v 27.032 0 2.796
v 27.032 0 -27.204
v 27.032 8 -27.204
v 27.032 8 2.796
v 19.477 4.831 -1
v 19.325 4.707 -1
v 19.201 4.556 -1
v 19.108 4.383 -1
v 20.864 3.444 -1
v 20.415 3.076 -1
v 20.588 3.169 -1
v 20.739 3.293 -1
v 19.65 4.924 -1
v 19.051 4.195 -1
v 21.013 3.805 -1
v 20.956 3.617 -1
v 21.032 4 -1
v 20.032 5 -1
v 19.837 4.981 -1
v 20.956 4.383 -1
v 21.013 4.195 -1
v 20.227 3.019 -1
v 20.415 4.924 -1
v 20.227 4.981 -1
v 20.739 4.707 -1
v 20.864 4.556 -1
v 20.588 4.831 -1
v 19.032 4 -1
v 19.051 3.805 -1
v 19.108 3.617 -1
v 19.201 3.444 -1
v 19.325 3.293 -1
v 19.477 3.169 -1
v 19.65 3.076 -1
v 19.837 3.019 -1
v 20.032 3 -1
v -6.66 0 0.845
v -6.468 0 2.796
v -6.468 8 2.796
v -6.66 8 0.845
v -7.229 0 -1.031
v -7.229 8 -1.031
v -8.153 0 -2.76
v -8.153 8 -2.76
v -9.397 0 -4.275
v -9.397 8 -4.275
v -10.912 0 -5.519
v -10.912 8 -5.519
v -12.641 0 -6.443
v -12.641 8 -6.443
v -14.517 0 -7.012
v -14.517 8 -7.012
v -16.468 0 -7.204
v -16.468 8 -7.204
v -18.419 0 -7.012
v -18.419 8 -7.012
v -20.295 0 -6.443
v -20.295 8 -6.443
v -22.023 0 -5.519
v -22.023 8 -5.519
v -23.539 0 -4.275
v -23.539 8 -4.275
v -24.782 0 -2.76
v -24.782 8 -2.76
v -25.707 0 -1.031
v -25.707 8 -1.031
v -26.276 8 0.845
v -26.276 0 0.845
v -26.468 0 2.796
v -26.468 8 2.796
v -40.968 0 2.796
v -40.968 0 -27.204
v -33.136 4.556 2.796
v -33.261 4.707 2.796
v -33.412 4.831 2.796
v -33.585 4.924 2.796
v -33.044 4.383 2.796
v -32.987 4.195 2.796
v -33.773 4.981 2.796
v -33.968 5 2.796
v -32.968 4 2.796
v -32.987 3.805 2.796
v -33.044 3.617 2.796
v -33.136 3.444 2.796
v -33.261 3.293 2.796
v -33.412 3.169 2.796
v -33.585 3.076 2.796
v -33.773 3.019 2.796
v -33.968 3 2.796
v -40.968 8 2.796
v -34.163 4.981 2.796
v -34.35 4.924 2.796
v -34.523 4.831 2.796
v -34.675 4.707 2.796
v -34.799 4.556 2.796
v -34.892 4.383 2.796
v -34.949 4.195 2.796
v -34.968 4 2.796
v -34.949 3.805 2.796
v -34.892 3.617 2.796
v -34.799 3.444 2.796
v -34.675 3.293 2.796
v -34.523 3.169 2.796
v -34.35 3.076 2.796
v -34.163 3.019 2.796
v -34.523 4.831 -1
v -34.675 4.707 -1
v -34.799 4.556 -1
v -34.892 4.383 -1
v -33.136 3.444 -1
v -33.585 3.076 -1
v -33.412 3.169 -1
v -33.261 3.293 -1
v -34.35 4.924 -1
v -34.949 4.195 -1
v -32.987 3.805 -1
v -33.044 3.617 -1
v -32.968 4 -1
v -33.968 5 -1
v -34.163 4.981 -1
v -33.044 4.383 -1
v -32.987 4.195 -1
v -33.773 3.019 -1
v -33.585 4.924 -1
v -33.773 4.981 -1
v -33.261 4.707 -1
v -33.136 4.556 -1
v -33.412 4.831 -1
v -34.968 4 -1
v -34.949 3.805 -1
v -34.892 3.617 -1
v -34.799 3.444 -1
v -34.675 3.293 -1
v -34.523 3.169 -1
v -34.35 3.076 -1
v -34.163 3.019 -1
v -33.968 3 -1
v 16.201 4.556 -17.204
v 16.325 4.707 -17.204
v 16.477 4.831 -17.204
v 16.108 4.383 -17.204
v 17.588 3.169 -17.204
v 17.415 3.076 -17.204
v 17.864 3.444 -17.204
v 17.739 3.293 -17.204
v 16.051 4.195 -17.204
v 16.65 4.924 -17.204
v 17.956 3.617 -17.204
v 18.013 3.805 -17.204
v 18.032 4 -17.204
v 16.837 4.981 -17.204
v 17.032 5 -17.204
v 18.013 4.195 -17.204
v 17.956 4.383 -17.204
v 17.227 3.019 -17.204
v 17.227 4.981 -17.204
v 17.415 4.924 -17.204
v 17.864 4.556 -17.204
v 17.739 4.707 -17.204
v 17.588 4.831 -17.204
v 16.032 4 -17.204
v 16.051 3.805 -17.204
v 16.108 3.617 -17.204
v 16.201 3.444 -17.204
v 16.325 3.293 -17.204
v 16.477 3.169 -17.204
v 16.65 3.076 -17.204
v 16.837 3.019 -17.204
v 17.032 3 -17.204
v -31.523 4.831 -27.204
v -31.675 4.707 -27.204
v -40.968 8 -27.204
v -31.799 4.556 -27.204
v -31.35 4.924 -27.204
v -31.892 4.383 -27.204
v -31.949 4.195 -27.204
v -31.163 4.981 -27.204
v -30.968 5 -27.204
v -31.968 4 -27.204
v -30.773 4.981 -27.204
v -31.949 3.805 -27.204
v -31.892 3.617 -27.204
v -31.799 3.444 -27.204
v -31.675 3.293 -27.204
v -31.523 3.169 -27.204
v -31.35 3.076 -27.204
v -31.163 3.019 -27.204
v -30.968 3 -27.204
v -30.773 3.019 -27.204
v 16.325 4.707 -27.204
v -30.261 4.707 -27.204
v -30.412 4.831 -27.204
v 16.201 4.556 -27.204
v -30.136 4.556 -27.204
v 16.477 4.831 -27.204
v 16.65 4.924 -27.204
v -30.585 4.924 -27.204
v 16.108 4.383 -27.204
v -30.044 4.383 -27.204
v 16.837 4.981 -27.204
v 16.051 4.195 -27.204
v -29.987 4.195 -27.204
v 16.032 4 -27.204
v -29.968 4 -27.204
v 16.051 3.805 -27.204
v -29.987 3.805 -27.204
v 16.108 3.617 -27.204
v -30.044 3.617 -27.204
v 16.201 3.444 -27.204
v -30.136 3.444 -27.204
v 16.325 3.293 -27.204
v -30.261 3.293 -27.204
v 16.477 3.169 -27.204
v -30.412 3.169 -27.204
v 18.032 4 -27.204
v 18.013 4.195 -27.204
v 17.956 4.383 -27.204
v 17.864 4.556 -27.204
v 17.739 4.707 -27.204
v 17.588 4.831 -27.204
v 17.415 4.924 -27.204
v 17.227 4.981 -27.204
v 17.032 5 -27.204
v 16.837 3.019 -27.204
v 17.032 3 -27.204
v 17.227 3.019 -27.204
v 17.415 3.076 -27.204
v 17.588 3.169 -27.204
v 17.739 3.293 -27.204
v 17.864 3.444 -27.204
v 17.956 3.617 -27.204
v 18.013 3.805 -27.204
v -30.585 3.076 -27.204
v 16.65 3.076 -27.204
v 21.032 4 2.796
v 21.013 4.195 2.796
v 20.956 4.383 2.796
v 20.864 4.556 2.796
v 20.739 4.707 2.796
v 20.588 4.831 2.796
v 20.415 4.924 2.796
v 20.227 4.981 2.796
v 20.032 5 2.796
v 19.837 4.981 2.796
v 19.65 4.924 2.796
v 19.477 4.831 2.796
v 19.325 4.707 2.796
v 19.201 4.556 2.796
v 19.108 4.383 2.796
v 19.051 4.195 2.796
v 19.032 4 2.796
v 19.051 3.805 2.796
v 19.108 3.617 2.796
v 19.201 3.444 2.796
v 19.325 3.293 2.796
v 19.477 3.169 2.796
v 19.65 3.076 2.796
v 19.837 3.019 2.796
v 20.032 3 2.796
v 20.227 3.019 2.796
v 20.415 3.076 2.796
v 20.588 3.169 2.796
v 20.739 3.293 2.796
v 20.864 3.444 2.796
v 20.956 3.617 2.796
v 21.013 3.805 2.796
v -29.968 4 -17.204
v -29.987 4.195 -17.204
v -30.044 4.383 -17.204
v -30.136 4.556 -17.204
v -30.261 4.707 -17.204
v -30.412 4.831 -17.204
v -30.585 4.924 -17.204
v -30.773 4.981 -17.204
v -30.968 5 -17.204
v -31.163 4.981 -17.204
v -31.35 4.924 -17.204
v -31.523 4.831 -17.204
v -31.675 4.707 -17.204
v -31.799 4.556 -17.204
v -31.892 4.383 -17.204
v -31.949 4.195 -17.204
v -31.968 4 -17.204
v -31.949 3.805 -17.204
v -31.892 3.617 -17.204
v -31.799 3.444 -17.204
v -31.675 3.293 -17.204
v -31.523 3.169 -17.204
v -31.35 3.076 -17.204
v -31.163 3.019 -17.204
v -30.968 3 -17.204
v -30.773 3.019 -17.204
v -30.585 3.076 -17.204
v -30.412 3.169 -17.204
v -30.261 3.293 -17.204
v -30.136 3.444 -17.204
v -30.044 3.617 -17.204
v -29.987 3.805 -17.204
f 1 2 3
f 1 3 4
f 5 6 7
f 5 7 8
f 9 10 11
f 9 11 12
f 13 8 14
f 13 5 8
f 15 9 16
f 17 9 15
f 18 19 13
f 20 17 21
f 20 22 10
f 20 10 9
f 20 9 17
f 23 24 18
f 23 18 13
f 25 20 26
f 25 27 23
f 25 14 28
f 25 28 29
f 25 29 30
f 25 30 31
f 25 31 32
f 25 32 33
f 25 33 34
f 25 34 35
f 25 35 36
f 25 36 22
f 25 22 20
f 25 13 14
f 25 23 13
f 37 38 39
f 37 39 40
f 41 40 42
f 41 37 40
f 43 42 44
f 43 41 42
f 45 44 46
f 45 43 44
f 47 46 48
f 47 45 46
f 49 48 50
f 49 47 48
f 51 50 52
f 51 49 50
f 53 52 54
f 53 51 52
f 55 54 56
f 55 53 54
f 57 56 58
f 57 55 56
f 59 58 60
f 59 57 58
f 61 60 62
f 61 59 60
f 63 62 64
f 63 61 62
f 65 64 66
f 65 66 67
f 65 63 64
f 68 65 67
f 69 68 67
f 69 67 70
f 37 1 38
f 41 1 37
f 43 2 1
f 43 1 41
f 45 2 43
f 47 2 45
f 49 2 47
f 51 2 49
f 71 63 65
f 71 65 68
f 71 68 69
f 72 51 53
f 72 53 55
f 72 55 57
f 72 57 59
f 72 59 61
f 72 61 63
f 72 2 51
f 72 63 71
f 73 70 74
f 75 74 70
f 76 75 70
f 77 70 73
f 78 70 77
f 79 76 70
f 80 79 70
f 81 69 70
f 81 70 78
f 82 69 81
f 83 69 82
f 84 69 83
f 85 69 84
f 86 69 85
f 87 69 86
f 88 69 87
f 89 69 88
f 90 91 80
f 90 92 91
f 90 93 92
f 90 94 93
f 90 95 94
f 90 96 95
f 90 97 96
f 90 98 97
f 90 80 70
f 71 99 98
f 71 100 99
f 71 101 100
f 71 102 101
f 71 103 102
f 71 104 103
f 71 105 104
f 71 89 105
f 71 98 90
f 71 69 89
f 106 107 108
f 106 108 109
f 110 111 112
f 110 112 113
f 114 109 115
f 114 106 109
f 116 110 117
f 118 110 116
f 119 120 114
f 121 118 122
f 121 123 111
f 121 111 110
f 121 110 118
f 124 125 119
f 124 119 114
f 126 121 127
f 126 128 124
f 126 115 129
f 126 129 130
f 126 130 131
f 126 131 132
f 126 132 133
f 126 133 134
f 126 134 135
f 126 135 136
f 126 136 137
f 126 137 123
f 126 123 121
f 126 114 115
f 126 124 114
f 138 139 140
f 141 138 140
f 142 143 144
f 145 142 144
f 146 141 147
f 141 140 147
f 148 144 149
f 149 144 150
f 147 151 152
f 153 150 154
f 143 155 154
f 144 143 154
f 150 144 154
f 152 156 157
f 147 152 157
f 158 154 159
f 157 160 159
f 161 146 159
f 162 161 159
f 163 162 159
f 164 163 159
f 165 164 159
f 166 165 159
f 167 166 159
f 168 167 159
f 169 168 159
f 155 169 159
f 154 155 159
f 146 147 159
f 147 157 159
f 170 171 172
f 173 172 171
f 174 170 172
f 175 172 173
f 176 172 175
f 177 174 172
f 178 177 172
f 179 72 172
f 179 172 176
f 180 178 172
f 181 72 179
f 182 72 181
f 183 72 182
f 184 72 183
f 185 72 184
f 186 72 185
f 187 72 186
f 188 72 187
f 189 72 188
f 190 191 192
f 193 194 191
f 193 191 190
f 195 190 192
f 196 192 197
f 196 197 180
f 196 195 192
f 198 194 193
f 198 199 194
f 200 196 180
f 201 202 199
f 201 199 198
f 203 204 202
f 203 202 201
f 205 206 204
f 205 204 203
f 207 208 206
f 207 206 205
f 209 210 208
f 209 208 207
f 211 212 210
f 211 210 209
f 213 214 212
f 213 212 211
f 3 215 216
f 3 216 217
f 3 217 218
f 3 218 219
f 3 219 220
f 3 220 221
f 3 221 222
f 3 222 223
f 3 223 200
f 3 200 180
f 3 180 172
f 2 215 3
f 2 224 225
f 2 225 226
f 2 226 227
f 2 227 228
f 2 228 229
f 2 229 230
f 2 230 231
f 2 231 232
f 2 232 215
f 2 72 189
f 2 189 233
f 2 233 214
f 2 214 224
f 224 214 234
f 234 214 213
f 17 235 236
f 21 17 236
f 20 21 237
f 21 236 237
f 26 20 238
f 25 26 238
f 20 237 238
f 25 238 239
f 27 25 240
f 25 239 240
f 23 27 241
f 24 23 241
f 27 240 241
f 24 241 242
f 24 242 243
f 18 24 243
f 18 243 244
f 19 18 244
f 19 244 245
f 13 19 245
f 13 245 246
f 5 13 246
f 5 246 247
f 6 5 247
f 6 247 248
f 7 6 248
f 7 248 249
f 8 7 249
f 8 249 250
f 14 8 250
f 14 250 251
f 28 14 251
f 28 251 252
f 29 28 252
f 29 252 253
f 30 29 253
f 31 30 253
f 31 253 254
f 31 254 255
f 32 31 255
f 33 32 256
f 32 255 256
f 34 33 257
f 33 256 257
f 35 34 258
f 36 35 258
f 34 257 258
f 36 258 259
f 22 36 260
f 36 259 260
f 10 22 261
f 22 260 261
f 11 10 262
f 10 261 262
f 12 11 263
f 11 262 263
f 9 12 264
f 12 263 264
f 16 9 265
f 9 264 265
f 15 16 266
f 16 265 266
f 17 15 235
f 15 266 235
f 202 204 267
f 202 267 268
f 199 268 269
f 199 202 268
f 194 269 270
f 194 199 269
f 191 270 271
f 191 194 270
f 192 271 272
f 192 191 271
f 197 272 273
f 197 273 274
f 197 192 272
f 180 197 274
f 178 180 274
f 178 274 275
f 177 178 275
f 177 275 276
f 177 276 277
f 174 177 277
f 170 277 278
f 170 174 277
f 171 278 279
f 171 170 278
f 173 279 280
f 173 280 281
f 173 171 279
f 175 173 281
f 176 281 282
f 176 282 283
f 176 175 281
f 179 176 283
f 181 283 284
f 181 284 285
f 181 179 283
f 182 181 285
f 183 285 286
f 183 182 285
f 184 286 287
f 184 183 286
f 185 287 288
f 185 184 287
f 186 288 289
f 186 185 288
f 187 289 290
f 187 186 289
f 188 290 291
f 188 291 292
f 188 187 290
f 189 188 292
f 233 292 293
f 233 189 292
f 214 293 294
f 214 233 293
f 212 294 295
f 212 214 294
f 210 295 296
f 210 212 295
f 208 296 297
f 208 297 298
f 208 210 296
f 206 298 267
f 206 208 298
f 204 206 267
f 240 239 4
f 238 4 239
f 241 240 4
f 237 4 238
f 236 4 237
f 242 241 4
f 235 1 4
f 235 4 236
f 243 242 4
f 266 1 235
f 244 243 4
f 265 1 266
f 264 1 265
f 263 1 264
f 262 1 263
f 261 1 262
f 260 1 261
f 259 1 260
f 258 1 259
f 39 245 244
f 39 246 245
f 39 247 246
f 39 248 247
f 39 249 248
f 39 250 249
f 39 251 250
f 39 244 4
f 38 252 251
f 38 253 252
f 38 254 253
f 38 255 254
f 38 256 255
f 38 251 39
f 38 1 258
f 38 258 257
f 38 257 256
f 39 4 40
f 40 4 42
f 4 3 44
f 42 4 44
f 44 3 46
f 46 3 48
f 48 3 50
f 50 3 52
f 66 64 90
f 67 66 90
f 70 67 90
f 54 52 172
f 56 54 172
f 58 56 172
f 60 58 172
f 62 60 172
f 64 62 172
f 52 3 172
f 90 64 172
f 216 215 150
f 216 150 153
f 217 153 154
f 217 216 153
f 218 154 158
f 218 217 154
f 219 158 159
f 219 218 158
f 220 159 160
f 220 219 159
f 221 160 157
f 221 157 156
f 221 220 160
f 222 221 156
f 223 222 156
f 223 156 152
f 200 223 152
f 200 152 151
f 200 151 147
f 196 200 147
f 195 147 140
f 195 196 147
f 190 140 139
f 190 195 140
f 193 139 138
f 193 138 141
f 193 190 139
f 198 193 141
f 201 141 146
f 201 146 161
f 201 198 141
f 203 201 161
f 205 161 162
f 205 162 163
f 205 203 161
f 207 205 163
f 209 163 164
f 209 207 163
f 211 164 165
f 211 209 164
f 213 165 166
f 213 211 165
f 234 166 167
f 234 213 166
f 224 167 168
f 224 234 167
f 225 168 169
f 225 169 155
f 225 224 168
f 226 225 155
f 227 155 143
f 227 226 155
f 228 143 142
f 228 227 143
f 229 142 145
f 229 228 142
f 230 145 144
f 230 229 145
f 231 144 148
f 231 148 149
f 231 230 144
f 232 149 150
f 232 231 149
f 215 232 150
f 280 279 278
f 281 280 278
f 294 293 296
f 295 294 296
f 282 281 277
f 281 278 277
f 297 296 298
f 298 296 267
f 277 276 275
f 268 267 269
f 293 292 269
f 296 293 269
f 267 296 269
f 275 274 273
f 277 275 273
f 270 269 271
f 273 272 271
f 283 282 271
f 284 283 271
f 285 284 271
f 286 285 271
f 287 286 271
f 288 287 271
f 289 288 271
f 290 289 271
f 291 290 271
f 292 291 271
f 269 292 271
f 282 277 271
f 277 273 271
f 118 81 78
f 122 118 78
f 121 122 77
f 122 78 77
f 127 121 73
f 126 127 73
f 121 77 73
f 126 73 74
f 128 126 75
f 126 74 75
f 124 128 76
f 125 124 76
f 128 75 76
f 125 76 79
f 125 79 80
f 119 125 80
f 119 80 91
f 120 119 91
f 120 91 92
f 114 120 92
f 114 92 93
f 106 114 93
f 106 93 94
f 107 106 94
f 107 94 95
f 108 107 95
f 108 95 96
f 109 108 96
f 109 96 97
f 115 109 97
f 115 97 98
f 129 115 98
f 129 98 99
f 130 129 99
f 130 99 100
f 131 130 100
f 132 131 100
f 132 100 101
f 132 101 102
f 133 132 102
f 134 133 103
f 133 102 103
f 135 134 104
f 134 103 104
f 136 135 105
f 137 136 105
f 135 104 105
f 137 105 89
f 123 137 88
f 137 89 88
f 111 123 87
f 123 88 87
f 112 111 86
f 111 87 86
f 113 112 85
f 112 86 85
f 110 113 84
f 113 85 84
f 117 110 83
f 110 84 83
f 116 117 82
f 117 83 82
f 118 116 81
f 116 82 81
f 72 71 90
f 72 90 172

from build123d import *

# Parameters (mm, degrees)
BOSS_EXTRUDE1_DEPTH = 8
CUT_EXTRUDE5_START  = 4
SKETCH2_R           = 1
CUT_EXTRUDE5_DEPTH  = 5
CUT_EXTRUDE6_START  = -27.204301
SKETCH3_R           = 1
CUT_EXTRUDE6_DEPTH  = 10


with BuildPart() as part:
    # Sketch1 → Boss-Extrude1 (new body)
    with BuildSketch(Plane(origin=(0, 0, 0), x_dir=(1, 0, 0), z_dir=(0, 1, 0))):
        with BuildLine():
            Line((-40.967741935, 27.204301075), (27.032258065, 27.204301075))
            Line((27.032258065, 27.204301075), (27.032258065, -2.795698925))
            Line((27.032258065, -2.795698925), (-6.467741935, -2.795698925))
            ThreePointArc((-6.467741935, -2.795698925), (-16.467741935, 7.204301075), (-26.467741935, -2.795698925))
            Line((-26.467741935, -2.795698925), (-40.967741935, -2.795698925))
            Line((-40.967741935, -2.795698925), (-40.967741935, 27.204301075))
        make_face()
    extrude(amount=BOSS_EXTRUDE1_DEPTH)

    # Sketch2 → Cut-Extrude5 (cut)
    with BuildSketch(Plane.XY.offset(CUT_EXTRUDE5_START)):
        with Locations((-33.967741935, 4)):
            Circle(SKETCH2_R)
        with Locations((20.032258065, 4)):
            Circle(SKETCH2_R)
    extrude(amount=-CUT_EXTRUDE5_DEPTH, mode=Mode.SUBTRACT)

    # Sketch3 → Cut-Extrude6 (cut)
    with BuildSketch(Plane.XY.offset(CUT_EXTRUDE6_START)):
        with Locations((17.032258065, 4)):
            Circle(SKETCH3_R)
        with Locations((-30.967741935, 4)):
            Circle(SKETCH3_R)
    extrude(amount=CUT_EXTRUDE6_DEPTH, mode=Mode.SUBTRACT)


solid = part.part
